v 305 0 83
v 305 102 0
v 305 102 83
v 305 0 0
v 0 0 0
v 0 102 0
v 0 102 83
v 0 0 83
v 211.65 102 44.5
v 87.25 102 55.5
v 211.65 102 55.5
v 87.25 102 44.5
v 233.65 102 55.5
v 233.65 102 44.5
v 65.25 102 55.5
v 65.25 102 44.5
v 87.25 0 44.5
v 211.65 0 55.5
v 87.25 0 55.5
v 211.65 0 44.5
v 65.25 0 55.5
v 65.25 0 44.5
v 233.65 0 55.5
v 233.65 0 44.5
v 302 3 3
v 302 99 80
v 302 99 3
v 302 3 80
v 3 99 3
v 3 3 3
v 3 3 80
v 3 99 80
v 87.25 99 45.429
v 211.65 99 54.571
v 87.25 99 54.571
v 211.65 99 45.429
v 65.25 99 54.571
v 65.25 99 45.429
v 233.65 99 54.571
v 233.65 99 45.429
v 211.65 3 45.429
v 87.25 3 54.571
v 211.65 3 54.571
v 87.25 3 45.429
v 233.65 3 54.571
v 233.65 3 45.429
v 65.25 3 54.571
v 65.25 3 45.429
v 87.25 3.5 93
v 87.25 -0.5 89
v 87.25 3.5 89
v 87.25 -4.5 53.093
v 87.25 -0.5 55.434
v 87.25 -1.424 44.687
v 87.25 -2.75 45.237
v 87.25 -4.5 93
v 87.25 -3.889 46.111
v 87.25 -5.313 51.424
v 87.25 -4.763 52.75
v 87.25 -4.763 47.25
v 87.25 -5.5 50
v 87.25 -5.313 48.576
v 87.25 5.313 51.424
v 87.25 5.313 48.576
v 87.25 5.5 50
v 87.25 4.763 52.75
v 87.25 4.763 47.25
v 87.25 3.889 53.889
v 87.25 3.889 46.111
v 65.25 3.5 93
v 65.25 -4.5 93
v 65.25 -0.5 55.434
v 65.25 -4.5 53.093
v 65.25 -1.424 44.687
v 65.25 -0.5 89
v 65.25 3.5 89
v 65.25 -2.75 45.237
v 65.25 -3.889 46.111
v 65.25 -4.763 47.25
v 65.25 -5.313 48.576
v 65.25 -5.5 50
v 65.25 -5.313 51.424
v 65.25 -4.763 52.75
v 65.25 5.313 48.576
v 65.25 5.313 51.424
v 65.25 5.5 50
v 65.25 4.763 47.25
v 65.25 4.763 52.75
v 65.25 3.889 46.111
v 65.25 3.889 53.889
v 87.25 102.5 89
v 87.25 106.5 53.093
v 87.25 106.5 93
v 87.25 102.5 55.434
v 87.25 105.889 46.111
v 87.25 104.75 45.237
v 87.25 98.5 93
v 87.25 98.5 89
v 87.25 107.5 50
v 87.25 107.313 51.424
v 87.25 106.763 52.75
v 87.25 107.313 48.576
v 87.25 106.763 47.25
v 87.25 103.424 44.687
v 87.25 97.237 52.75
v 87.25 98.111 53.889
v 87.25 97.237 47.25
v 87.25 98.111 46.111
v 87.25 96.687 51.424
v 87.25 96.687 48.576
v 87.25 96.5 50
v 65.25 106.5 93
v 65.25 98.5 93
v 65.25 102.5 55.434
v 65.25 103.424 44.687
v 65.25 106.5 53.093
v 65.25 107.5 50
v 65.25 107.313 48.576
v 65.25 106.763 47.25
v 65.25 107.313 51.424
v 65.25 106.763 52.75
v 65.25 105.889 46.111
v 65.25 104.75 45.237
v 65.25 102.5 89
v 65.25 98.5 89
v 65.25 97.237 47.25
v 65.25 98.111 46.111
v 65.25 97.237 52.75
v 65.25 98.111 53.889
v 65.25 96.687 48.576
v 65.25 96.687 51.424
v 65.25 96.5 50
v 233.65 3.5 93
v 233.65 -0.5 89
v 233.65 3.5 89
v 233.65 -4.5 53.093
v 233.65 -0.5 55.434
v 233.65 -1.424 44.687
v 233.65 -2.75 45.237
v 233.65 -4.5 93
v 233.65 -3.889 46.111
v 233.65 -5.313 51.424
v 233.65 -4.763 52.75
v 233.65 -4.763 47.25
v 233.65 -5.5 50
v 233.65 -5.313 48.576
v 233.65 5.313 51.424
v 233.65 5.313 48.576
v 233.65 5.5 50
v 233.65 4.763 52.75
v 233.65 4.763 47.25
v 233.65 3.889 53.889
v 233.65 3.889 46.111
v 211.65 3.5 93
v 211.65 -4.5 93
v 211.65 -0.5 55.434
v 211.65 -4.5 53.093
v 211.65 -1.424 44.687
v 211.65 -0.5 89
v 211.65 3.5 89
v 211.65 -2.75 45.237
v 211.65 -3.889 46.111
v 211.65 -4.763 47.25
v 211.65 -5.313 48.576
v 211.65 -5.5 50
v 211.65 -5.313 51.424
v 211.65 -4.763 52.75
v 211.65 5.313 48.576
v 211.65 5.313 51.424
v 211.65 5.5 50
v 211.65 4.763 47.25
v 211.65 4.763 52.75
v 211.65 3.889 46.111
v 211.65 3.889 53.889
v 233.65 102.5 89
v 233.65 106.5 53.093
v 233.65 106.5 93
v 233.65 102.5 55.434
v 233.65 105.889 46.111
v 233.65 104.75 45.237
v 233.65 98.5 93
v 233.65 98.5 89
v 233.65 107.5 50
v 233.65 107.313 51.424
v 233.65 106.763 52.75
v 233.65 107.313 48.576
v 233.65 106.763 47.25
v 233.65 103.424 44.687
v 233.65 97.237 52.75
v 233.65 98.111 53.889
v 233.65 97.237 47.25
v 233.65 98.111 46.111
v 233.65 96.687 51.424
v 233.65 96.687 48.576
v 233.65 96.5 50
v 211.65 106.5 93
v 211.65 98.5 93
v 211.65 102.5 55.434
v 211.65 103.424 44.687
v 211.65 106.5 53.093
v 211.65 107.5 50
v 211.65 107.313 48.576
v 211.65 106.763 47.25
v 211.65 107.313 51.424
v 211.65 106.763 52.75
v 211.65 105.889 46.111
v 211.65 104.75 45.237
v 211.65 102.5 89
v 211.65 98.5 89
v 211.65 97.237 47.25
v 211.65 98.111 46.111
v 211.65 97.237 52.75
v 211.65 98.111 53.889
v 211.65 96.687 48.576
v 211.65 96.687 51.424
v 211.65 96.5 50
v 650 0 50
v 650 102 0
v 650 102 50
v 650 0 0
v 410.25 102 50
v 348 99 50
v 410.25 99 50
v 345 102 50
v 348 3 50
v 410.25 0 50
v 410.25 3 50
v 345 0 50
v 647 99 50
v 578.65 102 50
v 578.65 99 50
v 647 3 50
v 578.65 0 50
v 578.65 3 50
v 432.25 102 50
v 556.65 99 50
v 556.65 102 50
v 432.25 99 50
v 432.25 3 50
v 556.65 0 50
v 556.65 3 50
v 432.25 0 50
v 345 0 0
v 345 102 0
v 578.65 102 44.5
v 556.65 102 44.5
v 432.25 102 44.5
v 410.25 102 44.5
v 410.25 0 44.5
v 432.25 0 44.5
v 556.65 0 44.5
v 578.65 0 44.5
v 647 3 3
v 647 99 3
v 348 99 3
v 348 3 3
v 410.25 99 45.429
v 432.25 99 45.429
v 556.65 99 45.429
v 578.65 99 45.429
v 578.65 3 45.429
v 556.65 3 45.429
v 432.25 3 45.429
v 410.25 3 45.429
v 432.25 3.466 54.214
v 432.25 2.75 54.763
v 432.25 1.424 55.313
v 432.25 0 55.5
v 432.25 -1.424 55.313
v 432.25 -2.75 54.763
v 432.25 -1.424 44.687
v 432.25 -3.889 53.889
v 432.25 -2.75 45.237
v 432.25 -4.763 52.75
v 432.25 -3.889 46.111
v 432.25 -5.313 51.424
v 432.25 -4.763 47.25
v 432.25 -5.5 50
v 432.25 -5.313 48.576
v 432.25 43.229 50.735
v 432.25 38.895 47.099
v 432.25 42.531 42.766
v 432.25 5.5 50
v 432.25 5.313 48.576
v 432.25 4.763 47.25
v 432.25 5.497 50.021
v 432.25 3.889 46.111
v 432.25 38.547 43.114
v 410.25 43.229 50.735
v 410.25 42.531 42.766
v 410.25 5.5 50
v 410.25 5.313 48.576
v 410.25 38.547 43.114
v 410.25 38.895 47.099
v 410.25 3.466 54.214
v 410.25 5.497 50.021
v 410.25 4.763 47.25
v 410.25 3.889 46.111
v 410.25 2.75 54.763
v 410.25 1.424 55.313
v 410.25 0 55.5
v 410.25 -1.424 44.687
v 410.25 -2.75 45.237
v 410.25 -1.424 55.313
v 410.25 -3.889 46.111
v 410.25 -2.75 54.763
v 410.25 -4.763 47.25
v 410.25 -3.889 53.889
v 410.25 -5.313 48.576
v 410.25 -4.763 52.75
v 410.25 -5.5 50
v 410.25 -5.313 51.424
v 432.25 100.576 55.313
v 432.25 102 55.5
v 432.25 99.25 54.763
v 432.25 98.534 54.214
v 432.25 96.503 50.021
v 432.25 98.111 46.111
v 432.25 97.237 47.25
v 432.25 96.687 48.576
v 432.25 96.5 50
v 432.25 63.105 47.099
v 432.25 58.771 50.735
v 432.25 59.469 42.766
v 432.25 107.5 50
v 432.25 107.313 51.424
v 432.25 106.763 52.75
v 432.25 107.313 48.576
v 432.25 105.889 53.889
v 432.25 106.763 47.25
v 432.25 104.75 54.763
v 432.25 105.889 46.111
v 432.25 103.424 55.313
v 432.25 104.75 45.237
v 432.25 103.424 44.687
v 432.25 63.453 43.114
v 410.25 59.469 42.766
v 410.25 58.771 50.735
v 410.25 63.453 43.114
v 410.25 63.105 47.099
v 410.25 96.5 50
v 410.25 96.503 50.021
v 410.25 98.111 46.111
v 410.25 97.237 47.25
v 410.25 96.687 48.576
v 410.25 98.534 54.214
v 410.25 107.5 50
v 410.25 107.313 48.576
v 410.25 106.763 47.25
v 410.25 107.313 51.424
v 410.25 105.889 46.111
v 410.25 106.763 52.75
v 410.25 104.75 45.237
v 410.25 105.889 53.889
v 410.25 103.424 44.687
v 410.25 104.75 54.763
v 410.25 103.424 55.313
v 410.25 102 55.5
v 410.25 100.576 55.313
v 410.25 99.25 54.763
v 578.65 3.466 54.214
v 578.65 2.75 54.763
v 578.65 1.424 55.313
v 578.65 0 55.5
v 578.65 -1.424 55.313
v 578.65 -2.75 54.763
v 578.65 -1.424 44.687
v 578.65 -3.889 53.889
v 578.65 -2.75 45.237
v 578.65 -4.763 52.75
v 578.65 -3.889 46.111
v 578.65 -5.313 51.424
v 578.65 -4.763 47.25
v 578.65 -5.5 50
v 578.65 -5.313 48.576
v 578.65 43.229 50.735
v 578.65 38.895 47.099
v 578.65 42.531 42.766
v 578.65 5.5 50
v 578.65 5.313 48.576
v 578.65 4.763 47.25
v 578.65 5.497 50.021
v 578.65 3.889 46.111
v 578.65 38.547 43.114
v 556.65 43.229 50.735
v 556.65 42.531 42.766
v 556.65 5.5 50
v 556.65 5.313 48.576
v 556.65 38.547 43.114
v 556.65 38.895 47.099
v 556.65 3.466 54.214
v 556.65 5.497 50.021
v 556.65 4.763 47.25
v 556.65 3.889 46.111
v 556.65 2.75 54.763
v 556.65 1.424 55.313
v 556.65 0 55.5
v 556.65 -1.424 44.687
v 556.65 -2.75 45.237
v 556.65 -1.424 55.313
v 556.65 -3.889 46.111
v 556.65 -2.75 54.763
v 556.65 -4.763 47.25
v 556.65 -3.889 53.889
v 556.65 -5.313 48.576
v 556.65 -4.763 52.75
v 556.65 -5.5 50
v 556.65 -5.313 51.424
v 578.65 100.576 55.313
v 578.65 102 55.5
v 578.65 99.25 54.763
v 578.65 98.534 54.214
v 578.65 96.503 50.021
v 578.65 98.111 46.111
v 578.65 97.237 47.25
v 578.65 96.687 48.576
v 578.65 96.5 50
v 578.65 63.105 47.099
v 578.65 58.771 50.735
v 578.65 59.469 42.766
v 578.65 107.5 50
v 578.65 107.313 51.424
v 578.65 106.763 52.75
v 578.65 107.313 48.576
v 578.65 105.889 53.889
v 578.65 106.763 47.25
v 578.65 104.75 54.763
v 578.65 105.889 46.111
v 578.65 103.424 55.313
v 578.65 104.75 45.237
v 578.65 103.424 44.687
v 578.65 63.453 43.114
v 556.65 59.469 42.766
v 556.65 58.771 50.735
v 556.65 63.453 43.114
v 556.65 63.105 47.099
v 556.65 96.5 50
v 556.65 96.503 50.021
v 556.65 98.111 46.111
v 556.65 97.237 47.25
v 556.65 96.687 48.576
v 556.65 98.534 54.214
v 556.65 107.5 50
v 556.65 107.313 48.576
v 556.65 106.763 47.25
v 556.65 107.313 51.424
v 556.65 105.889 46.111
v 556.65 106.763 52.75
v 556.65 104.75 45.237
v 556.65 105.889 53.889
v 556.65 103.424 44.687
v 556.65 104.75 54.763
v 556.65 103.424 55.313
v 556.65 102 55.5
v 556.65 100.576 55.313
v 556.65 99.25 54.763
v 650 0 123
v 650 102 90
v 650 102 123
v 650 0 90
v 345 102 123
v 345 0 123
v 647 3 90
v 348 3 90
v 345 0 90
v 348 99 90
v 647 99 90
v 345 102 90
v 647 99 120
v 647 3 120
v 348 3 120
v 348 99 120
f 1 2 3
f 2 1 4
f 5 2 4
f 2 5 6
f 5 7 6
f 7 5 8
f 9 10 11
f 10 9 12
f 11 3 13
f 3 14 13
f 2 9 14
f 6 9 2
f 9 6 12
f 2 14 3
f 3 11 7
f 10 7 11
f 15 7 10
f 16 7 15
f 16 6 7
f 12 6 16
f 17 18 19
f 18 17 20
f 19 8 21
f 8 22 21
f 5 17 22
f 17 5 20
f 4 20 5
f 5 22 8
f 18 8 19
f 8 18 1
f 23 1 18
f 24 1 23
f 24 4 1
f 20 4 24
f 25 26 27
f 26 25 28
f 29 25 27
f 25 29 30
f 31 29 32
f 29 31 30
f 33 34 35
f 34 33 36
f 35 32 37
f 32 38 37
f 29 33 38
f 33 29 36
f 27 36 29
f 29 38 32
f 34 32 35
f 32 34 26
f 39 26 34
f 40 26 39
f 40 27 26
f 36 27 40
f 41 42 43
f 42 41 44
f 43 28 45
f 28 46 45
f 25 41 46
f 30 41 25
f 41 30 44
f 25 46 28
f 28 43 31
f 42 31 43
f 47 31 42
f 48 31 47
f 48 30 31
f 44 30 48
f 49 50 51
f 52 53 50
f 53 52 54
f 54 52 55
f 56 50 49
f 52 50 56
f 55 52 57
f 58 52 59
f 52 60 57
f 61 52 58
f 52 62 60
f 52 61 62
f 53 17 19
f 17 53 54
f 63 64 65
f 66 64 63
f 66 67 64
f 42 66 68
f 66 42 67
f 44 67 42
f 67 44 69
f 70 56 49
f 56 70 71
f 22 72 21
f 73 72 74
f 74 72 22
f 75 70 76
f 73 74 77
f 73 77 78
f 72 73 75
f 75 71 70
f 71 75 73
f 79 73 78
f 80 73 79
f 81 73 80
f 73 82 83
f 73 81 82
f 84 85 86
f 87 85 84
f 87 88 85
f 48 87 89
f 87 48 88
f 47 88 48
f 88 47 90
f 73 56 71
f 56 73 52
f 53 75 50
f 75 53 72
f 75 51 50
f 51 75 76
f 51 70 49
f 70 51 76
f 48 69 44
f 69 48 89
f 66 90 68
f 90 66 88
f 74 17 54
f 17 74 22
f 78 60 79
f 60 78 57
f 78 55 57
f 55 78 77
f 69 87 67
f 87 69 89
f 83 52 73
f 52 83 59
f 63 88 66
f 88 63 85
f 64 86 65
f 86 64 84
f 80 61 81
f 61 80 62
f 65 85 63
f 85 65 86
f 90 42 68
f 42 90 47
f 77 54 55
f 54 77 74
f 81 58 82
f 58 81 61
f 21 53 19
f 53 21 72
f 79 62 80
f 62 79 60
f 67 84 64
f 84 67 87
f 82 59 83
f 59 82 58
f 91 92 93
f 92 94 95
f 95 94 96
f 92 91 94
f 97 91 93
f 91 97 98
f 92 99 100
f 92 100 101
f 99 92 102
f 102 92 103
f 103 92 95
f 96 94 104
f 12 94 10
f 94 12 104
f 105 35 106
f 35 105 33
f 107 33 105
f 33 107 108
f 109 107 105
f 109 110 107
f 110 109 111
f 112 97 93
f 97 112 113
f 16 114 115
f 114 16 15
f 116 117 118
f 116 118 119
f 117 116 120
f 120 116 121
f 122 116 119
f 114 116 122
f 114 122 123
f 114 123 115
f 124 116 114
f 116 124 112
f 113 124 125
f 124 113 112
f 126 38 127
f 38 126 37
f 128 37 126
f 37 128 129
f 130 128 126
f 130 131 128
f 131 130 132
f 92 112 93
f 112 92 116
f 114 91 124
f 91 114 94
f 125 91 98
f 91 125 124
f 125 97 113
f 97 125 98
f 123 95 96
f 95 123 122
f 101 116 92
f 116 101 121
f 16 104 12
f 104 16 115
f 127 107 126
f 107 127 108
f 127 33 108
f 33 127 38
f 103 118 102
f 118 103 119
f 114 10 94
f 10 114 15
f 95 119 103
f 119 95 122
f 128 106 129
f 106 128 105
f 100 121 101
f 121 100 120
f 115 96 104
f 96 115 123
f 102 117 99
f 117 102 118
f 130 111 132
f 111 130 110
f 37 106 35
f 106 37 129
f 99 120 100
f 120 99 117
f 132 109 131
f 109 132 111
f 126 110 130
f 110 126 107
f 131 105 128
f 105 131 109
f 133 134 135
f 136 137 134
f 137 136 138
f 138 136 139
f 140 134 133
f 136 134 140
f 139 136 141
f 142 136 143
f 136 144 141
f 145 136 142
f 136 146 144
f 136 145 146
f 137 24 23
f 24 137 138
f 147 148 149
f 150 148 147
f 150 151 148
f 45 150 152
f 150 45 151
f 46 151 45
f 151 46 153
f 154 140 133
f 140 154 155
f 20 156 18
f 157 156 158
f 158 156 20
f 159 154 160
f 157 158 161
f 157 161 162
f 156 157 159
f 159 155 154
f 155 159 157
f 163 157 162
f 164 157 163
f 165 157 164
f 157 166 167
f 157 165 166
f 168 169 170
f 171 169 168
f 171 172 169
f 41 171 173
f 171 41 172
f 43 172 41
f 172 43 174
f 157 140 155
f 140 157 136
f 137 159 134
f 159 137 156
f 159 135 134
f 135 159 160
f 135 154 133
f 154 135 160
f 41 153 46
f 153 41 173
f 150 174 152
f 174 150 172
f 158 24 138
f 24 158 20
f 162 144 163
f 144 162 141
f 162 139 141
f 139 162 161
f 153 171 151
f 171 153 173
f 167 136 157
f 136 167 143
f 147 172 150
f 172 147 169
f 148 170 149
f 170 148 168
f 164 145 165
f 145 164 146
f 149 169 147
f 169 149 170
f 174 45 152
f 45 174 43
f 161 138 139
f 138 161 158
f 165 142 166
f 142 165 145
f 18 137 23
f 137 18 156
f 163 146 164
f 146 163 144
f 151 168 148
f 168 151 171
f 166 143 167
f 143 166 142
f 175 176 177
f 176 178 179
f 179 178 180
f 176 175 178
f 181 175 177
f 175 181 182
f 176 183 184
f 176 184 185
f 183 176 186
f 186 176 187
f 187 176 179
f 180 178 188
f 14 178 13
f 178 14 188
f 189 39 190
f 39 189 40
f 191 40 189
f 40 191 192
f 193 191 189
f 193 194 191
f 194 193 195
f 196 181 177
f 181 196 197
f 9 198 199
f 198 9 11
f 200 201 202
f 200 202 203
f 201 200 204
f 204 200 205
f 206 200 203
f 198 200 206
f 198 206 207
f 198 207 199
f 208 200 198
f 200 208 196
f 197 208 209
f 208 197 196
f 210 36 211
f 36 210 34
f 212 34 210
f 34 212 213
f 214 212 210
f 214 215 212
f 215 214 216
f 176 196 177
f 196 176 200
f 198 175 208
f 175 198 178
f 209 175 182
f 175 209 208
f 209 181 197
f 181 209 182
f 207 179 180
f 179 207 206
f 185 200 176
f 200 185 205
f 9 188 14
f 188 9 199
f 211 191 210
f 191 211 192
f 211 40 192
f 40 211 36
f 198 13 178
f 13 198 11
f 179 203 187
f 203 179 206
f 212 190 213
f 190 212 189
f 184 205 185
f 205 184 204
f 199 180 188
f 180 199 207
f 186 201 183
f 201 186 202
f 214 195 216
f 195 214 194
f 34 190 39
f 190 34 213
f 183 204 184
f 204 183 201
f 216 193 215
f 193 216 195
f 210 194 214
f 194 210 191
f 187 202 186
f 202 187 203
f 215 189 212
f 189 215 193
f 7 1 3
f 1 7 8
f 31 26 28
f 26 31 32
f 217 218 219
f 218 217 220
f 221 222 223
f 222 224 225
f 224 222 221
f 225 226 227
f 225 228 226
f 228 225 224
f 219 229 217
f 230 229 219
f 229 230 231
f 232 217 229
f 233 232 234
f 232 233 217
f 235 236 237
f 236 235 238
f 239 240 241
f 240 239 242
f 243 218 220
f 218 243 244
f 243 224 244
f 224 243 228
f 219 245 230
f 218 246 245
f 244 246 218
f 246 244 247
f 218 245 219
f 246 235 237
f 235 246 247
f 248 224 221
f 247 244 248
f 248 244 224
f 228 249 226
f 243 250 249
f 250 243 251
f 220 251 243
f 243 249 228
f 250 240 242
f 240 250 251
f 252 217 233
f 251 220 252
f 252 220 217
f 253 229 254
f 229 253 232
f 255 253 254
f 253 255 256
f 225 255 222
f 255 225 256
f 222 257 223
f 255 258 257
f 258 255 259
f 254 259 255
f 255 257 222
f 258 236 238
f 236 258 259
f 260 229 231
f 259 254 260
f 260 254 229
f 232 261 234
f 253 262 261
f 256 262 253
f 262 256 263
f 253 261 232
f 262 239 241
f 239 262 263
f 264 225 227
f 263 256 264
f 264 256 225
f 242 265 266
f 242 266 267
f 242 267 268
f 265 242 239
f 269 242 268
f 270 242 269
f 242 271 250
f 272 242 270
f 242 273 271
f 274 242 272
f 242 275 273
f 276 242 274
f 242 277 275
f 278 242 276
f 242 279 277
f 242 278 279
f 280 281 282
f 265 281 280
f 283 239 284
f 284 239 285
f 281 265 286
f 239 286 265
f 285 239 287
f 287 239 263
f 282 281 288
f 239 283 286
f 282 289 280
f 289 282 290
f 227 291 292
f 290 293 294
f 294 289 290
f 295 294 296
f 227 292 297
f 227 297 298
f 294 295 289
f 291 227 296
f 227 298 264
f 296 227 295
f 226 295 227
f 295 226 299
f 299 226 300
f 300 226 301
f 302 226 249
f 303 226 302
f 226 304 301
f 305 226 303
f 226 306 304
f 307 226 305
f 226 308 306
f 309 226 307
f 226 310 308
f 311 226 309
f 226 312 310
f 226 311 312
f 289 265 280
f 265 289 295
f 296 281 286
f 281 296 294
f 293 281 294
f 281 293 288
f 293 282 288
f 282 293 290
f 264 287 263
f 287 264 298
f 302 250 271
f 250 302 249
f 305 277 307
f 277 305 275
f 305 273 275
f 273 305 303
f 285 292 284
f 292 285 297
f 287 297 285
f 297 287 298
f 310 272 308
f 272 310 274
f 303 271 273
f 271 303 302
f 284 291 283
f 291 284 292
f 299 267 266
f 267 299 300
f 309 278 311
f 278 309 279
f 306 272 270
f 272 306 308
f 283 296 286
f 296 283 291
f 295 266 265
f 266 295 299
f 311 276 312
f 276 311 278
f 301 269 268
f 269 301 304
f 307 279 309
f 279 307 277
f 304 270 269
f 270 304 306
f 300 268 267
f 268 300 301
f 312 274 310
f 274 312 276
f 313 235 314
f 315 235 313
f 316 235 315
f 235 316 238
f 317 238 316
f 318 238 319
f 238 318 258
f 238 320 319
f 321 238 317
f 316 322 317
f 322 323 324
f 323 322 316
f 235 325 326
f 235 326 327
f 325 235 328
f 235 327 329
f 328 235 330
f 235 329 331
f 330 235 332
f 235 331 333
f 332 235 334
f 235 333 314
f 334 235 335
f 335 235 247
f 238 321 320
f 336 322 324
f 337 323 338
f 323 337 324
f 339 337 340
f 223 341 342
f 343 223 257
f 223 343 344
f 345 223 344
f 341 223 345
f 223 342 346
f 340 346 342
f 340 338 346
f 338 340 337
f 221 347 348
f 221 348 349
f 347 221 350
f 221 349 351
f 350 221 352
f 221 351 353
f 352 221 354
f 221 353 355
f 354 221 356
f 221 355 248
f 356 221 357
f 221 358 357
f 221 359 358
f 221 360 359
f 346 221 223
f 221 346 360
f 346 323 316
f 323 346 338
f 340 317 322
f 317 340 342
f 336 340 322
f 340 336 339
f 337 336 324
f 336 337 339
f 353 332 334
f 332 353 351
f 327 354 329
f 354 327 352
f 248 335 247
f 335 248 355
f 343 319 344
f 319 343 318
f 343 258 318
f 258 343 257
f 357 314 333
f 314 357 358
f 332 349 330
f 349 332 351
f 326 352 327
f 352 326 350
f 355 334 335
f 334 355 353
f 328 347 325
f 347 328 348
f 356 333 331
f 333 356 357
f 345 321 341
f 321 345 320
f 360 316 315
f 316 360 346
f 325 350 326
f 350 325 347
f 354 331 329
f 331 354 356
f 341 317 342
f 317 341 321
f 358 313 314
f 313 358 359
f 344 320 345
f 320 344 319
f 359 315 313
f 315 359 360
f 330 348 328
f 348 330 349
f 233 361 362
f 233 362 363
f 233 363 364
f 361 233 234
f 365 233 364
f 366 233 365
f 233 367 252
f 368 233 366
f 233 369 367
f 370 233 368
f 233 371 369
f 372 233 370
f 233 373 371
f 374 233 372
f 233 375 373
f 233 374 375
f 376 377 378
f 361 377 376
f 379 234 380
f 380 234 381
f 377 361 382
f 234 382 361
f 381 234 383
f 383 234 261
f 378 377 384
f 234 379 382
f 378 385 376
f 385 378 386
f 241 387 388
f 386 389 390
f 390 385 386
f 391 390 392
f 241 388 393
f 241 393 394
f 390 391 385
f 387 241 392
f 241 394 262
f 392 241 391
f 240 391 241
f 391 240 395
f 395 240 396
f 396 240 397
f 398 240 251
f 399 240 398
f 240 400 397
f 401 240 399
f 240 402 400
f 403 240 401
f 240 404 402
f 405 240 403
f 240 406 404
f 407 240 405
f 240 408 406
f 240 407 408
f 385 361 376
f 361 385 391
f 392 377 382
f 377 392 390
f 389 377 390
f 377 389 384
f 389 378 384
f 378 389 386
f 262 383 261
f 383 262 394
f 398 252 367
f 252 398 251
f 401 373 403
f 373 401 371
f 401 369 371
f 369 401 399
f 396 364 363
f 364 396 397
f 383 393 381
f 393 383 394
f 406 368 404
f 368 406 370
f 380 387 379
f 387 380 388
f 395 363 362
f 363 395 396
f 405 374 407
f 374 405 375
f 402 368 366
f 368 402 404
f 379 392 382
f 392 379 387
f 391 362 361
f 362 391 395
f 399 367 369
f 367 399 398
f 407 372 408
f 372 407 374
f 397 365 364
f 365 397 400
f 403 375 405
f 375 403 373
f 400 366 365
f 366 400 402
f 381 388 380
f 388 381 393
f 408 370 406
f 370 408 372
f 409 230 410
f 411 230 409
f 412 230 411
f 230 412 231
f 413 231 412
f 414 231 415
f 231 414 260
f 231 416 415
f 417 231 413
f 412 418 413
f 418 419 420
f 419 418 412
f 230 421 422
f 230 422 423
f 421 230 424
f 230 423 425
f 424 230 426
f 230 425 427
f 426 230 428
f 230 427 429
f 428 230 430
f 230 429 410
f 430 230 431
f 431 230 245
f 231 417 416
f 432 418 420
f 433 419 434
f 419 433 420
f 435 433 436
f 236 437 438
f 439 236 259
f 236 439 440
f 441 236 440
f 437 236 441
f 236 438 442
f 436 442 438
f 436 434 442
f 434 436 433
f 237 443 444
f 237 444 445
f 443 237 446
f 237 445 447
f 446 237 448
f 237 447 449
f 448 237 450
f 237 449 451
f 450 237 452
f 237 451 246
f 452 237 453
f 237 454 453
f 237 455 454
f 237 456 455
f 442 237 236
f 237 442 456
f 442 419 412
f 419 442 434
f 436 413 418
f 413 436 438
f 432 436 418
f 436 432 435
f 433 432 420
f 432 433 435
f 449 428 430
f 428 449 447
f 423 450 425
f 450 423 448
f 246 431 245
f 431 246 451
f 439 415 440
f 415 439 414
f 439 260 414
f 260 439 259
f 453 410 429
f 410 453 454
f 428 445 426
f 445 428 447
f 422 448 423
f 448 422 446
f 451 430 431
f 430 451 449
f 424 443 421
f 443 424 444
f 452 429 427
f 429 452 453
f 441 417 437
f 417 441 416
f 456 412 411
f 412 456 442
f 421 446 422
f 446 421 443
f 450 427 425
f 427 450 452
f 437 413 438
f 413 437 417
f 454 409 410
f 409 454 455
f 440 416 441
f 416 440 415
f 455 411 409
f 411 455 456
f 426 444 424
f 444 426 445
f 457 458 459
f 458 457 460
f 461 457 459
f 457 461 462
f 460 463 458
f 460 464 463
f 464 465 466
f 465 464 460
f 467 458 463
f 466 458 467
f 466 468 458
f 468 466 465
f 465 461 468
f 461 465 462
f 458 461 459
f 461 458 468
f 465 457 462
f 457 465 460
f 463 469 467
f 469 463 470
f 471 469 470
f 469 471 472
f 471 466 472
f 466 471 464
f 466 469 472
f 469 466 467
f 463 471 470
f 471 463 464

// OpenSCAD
// 04_fliparm.scad
// RETROFIT: Flip-up lever arm — a paddle hinged on the NEW tray's outer wall.
// The hinge pivot is at the TOP of the new tray outer face (z≈NH).
// Engaged: arm hangs straight UP alongside top tray, lip curls inward over rim.
// Released: arm pivots outward & down (~90°) so tip clears the rim entirely.
// Four arms: 2 per long side (symmetric about mid-X).
// TOP TRAY FIXED — NO geometry added to it.
//
// LEFT: ENGAGED  |  RIGHT: RELEASED + EXPLODED

TW = 305; TD = 102; TH = 33;
NW = 305; ND = 102; NH = 50;
wall = 3;

// arm dims
arm_w   = 22;    // width along X
arm_t   = 4;     // thickness
arm_len = TH + 10; // length from pivot to tip (≫ TH=33 so tip clears rim)
lip_ext = 8;     // horizontal lip depth over rim
lip_t   = 4;     // lip thickness
gap     = 0.5;   // clearance between arm face and top tray outer face
pivot_r = 3;     // hinge pin radius

// Pivot sits at z = NH (new-tray top face), on the outer face.
// Local arm z=0 at pivot; arm extends in +Z (up) when angle=0.
ang_engaged  = 0;    // arm straight up, lip over rim
ang_released = 95;   // arm rotated outward past horizontal (~floor level)

C_new  = "#1565C0";
C_top  = "#90A4AE";
C_clip = "#6A1B9A";  // purple

sep = NW + 40;

module new_tray_body() {
    color(C_new)
    difference() {
        cube([NW, ND, NH]);
        translate([wall, wall, wall])
            cube([NW-2*wall, ND-2*wall, NH]);
    }
}

module top_tray_body(dz=0) {
    color(C_top)
    translate([0, 0, NH + dz])
    difference() {
        cube([TW, TD, TH]);
        translate([wall, wall, 0])
            cube([TW-2*wall, TD-2*wall, TH-wall]);
    }
}

// Hinge knuckle boss integral to new tray outer face.
// Centered at (0,0,0) in local space.
module hinge_knuckle() {
    color(C_new)
    rotate([0, 90, 0])
    cylinder(r=pivot_r+2.5, h=arm_w, center=true, $fn=24);
}

// Flip arm: pivot at local origin.
// Arm shaft goes in +Z from 0 to arm_len; lip at tip curls in -Y.
module flip_arm_shape(ang) {
    color(C_clip)
    rotate([ang, 0, 0])
    union() {
        // arm shaft — from pivot upward
        translate([-arm_w/2, gap, 0])
            cube([arm_w, arm_t, arm_len]);
        // lip at tip end — extends inward (-Y side, toward tray centerline)
        translate([-arm_w/2, gap - lip_ext + arm_t, arm_len - lip_t])
            cube([arm_w, lip_ext, lip_t]);
    }
}

// X positions
x_pos = [NW * 0.25, NW * 0.73];

module all_arms(ang) {
    for (xp = x_pos) {
        // FRONT side: pivot on outer face y=0, arm extends in -Y direction externally
        translate([xp, 0, NH]) {
            hinge_knuckle();
            mirror([0,1,0]) flip_arm_shape(ang);
        }
        // BACK side: pivot at y=ND
        translate([xp, ND, NH]) {
            hinge_knuckle();
            flip_arm_shape(ang);
        }
    }
}

// ENGAGED
translate([0,0,0]) {
    new_tray_body();
    all_arms(ang_engaged);
    top_tray_body(0);
}

// RELEASED + EXPLODED
translate([sep,0,0]) {
    new_tray_body();
    all_arms(ang_released);
    top_tray_body(40);
}
